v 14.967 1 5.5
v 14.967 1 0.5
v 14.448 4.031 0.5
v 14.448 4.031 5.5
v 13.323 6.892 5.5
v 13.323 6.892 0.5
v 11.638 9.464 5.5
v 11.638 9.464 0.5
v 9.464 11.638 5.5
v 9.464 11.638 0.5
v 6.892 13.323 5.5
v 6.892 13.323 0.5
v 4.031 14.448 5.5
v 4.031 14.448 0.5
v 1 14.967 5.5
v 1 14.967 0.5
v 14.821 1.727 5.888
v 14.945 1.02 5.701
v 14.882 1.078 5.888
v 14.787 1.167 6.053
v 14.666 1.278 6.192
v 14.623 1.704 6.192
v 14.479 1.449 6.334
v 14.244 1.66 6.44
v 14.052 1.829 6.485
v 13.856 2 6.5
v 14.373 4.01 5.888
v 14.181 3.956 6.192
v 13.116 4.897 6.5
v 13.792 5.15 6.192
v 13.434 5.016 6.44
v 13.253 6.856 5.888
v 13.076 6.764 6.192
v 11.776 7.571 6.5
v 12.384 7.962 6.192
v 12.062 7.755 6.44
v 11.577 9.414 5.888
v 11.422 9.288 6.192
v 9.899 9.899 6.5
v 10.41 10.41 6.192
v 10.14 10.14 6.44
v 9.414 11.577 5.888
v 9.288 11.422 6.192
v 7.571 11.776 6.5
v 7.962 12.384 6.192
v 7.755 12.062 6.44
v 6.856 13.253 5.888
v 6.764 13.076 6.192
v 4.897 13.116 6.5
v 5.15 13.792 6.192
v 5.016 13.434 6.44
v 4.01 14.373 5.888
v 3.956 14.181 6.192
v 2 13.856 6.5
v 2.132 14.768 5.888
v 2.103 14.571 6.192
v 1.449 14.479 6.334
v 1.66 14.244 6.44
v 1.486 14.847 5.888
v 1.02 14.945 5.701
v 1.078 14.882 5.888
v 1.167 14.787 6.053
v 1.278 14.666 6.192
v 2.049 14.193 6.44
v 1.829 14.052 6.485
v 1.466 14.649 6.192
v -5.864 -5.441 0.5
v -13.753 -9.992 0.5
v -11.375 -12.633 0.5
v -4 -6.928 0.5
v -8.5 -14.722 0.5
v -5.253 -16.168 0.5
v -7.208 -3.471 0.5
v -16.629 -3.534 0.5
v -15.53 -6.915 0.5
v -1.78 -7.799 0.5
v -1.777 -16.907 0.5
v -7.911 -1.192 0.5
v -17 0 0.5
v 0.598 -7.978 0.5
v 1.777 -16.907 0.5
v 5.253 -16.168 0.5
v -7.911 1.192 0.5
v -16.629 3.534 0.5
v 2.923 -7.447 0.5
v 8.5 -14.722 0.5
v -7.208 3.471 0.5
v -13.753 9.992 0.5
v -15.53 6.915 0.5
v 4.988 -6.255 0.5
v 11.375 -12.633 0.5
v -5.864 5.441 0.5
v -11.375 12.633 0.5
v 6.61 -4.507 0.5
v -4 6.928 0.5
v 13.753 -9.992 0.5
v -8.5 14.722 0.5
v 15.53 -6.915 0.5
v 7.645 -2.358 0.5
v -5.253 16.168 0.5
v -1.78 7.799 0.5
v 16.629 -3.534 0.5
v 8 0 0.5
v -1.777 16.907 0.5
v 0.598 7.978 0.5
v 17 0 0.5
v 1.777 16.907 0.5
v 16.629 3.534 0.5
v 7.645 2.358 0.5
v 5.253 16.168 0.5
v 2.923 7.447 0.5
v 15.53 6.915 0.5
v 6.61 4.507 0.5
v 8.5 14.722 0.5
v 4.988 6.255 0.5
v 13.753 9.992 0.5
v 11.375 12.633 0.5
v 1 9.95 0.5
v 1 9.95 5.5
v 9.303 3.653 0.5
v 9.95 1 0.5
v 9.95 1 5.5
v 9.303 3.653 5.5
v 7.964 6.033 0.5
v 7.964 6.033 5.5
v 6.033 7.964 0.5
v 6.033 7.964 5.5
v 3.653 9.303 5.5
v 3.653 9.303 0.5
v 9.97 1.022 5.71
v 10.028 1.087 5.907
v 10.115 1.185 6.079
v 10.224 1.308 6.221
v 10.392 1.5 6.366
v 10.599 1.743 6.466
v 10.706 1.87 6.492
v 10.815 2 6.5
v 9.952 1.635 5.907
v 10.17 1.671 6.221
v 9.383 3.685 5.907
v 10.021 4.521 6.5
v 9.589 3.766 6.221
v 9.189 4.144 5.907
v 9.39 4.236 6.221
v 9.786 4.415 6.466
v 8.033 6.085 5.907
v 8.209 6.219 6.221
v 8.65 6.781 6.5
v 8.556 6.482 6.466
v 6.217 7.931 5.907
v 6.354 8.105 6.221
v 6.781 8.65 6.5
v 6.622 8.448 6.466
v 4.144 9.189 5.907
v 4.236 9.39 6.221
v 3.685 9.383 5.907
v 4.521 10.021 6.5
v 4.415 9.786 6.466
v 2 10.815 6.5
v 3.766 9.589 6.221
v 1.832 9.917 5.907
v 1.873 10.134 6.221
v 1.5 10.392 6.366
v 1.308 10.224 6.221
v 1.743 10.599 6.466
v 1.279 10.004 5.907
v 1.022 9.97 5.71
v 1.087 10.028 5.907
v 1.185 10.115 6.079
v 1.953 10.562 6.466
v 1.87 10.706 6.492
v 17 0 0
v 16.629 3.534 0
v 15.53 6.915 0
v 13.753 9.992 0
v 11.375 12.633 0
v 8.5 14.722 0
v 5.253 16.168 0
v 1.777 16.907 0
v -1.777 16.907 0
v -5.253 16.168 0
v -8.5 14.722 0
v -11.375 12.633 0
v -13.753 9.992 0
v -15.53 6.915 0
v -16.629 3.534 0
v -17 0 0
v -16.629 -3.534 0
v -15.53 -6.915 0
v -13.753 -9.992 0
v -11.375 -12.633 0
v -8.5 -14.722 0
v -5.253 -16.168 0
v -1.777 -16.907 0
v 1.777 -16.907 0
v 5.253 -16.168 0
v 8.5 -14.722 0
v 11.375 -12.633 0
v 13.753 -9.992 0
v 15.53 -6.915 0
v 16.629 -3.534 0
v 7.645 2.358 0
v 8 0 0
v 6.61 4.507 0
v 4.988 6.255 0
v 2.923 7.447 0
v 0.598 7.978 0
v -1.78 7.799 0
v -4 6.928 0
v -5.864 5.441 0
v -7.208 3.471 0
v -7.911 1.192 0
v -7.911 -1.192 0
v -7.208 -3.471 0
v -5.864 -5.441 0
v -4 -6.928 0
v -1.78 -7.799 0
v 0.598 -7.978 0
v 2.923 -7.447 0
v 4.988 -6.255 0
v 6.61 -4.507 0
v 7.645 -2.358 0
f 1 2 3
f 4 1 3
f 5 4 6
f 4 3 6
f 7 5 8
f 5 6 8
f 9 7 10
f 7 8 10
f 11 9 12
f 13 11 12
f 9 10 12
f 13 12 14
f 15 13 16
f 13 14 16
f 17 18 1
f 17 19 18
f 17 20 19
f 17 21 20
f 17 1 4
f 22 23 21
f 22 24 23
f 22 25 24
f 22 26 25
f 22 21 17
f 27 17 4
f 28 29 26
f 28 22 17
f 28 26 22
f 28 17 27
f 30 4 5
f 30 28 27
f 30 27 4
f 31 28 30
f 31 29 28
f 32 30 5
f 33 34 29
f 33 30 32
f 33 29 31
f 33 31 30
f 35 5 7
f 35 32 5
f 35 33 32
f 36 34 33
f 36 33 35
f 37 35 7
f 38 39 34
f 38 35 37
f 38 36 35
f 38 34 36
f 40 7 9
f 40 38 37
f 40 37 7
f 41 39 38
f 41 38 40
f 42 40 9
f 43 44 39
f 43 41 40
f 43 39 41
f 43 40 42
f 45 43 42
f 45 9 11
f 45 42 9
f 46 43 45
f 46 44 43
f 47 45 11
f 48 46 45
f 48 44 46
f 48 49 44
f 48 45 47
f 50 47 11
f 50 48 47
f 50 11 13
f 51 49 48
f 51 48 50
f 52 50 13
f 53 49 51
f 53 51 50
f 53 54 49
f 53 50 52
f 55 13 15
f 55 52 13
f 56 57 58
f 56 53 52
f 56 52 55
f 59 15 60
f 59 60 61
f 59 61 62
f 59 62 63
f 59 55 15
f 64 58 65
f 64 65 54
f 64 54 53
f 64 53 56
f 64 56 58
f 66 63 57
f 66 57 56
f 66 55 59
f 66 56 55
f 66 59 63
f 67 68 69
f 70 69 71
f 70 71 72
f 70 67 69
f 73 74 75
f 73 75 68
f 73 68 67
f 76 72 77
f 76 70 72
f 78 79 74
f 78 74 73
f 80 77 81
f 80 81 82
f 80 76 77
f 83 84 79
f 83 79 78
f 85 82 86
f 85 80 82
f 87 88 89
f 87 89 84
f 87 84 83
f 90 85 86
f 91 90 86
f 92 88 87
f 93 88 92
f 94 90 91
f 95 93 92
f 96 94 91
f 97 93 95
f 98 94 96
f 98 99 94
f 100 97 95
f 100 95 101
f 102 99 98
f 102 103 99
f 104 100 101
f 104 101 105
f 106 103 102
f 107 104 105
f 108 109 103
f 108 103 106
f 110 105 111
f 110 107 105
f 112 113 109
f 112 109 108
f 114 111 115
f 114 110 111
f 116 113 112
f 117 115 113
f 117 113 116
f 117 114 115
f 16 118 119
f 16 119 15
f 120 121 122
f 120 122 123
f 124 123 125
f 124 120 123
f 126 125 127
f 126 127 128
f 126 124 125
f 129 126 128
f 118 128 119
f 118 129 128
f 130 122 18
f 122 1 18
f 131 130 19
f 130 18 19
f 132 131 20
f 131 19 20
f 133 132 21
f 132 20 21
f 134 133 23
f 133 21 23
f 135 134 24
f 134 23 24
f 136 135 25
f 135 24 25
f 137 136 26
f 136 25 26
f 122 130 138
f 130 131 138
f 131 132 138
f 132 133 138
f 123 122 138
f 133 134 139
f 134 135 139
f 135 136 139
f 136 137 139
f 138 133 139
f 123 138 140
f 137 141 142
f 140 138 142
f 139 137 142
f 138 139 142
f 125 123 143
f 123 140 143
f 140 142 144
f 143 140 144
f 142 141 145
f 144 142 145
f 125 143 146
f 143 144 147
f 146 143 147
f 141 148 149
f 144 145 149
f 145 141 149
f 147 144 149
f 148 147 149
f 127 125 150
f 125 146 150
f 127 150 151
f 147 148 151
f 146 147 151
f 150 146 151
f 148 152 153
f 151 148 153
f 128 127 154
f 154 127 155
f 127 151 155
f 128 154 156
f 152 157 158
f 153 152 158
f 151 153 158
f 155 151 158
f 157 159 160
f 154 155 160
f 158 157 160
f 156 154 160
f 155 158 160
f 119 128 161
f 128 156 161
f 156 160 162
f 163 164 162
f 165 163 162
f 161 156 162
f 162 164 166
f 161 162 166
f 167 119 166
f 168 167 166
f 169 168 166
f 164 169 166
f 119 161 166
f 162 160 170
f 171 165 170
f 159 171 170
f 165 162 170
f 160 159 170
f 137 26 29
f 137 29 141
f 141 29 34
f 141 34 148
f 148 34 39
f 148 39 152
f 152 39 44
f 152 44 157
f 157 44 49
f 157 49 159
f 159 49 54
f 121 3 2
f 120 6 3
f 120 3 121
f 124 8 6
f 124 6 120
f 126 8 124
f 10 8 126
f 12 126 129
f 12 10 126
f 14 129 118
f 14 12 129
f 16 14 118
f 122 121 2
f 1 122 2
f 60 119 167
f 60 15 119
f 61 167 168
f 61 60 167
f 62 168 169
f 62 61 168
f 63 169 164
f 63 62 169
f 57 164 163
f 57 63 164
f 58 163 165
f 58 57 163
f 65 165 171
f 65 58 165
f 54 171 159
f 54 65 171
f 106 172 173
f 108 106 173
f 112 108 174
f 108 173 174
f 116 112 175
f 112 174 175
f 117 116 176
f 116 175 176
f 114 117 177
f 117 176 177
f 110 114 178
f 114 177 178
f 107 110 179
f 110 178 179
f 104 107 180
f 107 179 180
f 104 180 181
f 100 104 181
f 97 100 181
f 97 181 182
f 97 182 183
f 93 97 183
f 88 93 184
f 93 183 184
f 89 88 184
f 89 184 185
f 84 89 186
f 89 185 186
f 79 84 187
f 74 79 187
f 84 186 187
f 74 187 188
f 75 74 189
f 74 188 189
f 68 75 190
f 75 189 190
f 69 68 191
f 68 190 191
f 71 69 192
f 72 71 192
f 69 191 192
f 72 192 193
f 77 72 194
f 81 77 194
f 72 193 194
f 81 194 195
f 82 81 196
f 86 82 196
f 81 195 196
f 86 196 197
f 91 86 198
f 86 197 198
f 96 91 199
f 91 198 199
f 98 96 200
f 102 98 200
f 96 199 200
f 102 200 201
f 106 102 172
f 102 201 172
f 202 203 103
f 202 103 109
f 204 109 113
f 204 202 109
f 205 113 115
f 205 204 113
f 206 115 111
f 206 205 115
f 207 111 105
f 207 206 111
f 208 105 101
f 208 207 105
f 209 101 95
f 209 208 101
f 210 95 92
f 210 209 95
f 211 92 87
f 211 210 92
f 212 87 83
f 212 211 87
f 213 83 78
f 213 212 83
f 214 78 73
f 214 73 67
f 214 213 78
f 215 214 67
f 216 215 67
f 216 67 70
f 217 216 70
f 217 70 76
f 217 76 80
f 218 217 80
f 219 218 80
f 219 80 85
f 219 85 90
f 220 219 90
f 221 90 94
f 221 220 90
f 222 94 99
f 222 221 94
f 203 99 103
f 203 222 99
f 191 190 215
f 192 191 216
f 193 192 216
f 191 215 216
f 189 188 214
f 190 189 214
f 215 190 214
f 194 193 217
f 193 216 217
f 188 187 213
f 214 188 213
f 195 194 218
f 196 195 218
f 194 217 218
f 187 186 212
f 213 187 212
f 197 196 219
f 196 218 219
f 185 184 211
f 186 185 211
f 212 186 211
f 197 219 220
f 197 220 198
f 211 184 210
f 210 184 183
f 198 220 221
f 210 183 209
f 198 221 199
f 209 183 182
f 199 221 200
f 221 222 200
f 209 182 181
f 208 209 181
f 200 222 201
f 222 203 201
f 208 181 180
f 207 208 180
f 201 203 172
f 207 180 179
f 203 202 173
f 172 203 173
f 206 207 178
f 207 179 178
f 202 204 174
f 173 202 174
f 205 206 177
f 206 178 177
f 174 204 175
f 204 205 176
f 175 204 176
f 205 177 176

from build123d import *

# Parameters (mm, degrees)
SKETCH002_R  = 8
PAD002_DEPTH = 0.5
SKETCH_R     = 17
PAD_DEPTH    = 0.5
PAD003_DEPTH = 6
FILLET_R     = 1


with BuildPart() as pad002:
    # Sketch002 → Pad002 (new body)
    with BuildSketch(Plane.XY):
        Circle(SKETCH002_R)
    extrude(amount=PAD002_DEPTH)


with BuildPart() as cut:
    # Sketch → Pad (new body)
    with BuildSketch(Plane.XY):
        Circle(SKETCH_R)
    extrude(amount=PAD_DEPTH)

    # Cut: cut Pad002
    add(pad002.part, mode=Mode.SUBTRACT)


with BuildPart() as fillet_body:
    # Sketch003 → Pad003 (new body)
    with BuildSketch(Plane.XY.offset(0.5)):
        with BuildLine():
            Line((1, 9.949874), (1, 14.96663))
            ThreePointArc((14.96663, 1), (10.606602, 10.606602), (1, 14.96663))
            Line((9.949874, 1), (14.96663, 1))
            ThreePointArc((9.949874, 1), (7.064649, 7.064649), (1, 9.949874))
        make_face()
    extrude(amount=PAD003_DEPTH)

    # Fillet
    fillet_edges = [fillet_body.edges().sort_by_distance(p)[0] for p in [
        (7.064649, 7.064649, 6.5),
        (12.458252, 1, 6.5),
        (10.606602, 10.606602, 6.5),
        (1, 12.458252, 6.5),
    ]]
    fillet(fillet_edges, radius=FILLET_R)


solid = Compound([cut.part, fillet_body.part])
